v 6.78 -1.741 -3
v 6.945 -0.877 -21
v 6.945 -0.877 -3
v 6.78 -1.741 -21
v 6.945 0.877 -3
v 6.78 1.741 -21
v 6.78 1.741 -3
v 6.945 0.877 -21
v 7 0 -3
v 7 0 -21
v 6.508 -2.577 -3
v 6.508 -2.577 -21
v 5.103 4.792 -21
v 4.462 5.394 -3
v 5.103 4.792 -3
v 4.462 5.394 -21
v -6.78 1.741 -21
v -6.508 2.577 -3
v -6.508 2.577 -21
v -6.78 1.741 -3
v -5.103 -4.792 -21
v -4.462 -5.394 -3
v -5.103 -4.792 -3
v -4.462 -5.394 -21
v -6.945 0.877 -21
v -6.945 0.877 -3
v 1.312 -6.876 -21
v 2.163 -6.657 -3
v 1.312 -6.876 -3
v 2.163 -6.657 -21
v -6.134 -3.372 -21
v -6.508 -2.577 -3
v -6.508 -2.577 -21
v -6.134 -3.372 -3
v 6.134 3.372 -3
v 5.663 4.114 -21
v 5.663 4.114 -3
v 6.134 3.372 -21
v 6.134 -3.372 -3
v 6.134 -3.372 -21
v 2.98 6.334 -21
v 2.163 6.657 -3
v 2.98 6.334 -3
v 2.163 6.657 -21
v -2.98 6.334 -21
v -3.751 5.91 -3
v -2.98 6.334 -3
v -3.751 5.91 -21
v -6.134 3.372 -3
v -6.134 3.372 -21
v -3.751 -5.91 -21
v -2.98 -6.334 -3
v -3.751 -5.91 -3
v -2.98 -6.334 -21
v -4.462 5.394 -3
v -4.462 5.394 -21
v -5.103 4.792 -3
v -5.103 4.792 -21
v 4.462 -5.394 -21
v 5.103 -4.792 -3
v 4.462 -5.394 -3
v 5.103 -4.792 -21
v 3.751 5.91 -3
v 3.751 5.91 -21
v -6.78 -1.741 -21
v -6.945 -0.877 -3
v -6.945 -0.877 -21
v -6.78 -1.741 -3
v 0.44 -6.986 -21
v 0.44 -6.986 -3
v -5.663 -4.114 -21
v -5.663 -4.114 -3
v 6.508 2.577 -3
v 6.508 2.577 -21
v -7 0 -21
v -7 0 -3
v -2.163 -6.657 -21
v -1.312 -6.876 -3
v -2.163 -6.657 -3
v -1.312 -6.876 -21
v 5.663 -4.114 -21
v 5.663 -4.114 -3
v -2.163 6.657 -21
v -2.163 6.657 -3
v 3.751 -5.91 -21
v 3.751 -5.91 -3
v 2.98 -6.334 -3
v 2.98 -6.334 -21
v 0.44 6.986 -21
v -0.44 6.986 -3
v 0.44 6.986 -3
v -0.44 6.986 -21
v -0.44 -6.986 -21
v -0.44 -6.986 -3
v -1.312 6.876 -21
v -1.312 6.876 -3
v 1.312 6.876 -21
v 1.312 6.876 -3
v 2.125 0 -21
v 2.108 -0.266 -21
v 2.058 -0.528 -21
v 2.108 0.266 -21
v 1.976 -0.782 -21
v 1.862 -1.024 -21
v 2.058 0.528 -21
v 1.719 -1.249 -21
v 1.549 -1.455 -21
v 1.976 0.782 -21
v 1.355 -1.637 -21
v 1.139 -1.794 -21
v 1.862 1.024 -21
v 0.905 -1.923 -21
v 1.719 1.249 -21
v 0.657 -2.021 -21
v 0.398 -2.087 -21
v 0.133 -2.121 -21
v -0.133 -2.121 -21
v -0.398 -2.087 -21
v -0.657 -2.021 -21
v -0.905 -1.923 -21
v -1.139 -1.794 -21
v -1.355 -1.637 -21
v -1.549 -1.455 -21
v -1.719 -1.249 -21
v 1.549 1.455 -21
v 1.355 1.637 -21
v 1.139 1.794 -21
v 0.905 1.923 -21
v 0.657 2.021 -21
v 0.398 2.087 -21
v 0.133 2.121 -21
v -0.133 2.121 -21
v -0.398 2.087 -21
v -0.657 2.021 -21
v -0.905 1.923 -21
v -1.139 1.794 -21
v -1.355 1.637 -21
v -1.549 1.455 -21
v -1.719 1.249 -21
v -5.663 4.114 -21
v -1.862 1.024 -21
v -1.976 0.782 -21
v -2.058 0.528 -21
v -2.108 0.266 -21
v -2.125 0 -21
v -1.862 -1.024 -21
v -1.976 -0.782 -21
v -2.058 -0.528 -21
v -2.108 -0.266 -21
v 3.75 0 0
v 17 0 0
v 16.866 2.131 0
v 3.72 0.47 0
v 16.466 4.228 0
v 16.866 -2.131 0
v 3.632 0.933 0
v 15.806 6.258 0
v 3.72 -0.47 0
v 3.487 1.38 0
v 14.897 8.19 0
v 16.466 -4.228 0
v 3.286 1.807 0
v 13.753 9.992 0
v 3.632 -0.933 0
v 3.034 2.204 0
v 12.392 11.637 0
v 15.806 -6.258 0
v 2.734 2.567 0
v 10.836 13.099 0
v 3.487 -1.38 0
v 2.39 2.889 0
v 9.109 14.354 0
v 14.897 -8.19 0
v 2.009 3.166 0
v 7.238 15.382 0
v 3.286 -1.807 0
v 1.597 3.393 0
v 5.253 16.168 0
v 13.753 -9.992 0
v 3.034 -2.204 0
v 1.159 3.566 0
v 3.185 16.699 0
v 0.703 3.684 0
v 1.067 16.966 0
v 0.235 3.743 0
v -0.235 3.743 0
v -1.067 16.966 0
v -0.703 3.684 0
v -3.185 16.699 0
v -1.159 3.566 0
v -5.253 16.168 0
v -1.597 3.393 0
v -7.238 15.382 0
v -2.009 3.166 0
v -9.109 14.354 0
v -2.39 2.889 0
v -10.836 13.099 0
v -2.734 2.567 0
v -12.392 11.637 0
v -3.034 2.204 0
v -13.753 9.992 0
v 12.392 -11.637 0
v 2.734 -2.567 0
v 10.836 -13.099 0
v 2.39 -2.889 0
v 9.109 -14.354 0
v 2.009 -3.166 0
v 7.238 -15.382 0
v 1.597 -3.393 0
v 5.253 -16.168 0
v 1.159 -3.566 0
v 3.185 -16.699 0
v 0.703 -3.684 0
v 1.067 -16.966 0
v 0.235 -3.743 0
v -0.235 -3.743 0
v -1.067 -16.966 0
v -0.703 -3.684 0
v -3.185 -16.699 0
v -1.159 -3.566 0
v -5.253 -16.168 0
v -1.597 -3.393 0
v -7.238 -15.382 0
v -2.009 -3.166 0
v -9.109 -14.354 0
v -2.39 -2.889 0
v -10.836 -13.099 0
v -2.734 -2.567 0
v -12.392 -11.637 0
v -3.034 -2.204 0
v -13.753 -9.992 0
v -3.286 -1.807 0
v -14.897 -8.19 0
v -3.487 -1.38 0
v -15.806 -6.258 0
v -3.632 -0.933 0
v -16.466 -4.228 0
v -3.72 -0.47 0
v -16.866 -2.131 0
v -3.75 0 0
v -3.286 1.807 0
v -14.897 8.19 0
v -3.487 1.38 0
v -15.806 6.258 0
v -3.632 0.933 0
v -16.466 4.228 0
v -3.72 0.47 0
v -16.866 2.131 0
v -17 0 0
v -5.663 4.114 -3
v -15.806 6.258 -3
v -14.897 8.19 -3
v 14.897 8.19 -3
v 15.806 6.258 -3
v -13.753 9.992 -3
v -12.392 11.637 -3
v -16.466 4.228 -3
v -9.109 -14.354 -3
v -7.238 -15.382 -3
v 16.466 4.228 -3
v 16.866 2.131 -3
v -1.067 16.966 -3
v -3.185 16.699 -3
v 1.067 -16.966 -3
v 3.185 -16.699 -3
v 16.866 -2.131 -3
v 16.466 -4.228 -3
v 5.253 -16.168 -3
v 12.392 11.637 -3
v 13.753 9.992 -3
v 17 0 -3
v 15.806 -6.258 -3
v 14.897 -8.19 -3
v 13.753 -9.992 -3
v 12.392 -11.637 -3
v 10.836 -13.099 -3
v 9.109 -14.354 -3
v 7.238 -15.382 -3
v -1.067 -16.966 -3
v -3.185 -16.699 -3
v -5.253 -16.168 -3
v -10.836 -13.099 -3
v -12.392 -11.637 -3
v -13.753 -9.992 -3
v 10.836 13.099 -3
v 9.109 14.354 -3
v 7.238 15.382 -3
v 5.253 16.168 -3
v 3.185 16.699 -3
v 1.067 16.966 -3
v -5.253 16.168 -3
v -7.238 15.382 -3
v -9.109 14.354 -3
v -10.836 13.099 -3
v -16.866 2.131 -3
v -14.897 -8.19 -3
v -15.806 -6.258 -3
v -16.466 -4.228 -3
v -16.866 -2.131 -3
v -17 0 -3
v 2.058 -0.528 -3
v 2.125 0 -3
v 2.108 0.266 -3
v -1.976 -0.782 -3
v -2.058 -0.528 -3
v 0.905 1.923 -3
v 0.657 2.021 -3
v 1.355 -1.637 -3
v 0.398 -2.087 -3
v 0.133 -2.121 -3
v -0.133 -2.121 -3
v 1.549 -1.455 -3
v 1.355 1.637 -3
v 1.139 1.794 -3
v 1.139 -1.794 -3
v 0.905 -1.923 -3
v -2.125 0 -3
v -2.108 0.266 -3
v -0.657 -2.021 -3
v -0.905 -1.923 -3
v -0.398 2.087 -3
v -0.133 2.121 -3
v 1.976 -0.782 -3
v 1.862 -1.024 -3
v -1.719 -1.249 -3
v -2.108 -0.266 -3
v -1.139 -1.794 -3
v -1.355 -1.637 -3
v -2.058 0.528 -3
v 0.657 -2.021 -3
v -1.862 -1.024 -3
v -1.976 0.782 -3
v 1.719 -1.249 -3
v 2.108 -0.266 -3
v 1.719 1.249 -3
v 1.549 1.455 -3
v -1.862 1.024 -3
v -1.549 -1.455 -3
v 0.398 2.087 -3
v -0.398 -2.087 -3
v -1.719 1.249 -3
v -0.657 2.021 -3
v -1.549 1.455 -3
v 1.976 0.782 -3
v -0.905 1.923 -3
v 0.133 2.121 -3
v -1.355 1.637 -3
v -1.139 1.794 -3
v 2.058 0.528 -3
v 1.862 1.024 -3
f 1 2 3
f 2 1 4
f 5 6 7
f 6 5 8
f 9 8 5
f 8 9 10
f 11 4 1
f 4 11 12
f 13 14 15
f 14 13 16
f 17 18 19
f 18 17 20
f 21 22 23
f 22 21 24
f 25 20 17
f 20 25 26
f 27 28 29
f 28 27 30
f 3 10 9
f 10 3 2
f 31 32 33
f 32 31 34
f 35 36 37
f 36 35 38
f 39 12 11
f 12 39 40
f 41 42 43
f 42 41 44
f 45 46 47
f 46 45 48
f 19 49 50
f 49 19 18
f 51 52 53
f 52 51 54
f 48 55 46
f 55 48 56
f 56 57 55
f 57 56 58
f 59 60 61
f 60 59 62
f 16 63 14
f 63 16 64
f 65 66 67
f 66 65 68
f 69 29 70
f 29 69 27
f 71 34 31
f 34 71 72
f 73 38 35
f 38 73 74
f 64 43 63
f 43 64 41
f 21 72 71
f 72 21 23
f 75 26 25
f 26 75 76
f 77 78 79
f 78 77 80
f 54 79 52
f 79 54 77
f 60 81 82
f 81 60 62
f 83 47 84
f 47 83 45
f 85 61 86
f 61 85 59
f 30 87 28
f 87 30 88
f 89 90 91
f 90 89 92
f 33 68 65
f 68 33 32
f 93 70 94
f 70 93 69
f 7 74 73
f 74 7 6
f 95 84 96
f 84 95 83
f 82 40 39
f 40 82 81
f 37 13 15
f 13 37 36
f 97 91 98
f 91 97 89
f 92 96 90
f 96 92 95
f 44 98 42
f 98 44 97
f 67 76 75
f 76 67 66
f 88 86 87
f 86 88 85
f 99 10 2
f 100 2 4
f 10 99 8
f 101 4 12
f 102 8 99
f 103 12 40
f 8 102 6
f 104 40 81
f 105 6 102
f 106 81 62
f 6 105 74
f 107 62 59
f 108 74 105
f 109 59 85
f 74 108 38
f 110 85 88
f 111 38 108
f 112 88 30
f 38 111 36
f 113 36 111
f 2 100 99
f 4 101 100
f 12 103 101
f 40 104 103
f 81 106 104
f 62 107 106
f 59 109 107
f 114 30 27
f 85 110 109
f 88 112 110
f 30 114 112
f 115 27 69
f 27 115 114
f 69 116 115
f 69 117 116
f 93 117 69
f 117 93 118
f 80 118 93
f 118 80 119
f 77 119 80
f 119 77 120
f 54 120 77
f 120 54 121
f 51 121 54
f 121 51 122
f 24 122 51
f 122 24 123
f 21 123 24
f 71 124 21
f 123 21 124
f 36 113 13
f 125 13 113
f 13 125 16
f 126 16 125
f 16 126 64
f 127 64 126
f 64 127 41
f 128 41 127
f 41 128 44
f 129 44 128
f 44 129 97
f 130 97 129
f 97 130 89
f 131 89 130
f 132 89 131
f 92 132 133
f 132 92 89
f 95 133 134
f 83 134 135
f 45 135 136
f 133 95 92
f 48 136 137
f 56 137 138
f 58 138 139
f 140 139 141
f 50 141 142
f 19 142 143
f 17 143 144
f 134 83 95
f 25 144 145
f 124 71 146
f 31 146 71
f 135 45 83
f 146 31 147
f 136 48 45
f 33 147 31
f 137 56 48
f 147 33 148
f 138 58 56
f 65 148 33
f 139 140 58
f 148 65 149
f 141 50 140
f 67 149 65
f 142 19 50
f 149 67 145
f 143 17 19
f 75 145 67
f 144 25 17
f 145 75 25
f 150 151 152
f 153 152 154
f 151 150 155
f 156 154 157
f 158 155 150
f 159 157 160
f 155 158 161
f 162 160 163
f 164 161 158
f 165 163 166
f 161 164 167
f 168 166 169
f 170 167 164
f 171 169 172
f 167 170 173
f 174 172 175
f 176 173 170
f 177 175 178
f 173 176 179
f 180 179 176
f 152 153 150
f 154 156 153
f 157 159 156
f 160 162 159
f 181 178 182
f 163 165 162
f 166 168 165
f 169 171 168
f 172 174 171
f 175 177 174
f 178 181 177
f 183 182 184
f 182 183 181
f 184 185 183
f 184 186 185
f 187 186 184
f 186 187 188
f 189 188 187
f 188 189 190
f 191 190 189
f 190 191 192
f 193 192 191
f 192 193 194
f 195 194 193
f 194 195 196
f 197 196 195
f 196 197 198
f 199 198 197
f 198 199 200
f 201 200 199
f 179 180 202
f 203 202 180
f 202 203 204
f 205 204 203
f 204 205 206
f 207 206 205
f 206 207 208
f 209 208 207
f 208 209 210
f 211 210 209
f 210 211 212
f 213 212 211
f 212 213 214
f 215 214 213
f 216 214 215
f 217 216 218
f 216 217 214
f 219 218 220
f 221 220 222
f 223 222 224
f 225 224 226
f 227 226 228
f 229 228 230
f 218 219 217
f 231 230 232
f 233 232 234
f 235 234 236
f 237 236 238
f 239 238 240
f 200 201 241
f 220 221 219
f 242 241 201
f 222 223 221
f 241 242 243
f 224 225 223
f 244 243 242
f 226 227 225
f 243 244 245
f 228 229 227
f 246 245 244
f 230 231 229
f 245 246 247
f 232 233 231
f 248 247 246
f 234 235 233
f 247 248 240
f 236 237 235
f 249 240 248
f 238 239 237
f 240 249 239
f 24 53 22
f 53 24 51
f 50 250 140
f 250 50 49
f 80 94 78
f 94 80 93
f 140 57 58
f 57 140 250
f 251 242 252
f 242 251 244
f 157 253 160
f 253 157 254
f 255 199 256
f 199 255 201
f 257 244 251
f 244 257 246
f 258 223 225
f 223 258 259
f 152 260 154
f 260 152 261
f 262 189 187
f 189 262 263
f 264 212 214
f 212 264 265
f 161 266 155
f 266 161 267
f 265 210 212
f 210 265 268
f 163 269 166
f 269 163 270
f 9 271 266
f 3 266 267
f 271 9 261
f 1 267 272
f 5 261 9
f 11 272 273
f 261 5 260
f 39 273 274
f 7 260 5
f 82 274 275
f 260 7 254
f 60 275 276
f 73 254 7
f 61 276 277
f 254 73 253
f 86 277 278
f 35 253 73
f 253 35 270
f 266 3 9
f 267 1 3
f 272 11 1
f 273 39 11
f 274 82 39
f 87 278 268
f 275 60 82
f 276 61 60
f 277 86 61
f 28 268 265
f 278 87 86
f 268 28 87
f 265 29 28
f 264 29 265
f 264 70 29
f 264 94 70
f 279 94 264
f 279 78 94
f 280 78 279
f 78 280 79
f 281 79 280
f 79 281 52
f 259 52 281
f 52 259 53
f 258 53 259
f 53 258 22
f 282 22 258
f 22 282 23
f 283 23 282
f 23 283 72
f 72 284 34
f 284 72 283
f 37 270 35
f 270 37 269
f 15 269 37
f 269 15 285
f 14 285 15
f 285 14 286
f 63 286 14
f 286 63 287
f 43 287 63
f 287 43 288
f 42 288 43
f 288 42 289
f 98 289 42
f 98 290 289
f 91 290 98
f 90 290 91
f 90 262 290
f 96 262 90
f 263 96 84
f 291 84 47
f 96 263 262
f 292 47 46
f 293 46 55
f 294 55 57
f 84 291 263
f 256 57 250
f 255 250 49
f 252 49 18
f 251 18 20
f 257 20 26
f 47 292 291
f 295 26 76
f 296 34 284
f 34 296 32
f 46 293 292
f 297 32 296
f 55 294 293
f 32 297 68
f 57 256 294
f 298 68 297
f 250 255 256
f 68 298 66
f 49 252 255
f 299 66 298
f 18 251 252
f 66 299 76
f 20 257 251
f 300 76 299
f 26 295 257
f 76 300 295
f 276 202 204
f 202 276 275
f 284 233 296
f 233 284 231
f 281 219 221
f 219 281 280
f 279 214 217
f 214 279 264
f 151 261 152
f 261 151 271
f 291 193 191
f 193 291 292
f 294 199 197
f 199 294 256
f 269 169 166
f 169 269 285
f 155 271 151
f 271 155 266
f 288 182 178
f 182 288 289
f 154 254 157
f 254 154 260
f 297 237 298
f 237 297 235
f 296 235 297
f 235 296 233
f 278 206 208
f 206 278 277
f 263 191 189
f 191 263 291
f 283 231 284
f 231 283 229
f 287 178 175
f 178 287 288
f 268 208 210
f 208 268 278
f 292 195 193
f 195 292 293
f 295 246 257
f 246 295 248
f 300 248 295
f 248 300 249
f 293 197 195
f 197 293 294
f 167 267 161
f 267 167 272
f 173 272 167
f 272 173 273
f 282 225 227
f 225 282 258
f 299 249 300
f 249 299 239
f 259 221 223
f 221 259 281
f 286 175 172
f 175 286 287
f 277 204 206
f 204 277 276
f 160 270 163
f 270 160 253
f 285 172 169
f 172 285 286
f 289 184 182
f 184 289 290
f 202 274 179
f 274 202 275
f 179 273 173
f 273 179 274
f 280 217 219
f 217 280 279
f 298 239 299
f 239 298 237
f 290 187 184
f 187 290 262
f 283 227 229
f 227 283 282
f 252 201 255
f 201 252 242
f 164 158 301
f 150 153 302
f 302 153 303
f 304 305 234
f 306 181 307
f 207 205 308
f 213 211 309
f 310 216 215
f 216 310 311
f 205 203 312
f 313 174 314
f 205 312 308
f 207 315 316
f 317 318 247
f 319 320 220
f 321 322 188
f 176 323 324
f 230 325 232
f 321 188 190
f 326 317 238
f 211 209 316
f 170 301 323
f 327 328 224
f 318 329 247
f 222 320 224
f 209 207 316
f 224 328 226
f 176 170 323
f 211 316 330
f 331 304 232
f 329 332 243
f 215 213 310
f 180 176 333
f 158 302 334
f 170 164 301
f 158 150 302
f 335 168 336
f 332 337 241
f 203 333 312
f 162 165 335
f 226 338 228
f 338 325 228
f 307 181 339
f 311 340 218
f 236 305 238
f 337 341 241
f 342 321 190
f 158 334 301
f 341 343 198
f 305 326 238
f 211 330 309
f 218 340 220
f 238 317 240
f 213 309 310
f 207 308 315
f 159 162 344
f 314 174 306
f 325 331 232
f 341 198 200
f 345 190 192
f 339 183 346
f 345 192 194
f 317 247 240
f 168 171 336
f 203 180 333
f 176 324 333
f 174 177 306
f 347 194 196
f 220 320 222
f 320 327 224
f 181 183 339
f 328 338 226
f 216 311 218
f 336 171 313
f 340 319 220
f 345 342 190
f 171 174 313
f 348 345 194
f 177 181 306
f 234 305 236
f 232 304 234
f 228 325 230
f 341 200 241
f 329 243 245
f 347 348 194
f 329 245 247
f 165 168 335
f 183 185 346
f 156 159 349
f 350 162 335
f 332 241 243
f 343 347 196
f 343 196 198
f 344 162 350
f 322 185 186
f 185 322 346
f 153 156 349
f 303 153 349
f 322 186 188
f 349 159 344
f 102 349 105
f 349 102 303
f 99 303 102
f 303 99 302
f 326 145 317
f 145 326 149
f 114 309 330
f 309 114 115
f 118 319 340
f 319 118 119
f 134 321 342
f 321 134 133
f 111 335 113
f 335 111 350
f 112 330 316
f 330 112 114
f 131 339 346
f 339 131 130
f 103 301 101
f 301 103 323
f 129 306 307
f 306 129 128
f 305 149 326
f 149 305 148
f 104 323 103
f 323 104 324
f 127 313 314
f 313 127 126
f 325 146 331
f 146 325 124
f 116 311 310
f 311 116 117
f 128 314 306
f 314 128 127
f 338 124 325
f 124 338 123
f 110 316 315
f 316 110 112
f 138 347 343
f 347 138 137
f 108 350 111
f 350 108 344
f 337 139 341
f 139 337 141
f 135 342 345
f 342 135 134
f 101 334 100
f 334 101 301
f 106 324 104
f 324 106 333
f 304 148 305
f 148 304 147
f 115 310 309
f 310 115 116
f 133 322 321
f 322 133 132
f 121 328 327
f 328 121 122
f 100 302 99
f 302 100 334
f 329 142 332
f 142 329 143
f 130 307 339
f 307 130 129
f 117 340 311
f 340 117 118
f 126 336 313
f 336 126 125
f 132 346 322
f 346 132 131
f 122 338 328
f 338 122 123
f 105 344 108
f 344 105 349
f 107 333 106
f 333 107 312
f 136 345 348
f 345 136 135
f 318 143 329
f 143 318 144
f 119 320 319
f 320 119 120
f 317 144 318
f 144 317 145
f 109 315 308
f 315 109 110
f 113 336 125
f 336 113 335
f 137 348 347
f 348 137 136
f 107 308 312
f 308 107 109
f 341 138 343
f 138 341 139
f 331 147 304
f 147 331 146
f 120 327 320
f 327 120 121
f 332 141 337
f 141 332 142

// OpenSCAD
$fn = 50;


difference() {
	union() {
		translate(v = [0, 0, -21.0000000000]) {
			cylinder(h = 21, r = 7.0000000000);
		}
		translate(v = [0, 0, -3.0000000000]) {
			cylinder(h = 3, r = 17.0000000000);
		}
	}
	union() {
		translate(v = [0, 0, 0]) {
			rotate(a = [0, 0, 0]) {
				difference() {
					union() {
						#translate(v = [0, 0, -21.0000000000]) {
							cylinder(h = 21, r = 2.0000000000);
						}
						#translate(v = [0, 0, -3]) {
							cylinder(h = 3, r1 = 2.1250000000, r2 = 3.7500000000);
						}
						#translate(v = [0, 0, -21.0000000000]) {
							cylinder(h = 21, r = 2.1250000000);
						}
						#translate(v = [0, 0, -21.0000000000]) {
							cylinder(h = 21, r = 2.0000000000);
						}
					}
					union();
				}
			}
		}
	}
}
